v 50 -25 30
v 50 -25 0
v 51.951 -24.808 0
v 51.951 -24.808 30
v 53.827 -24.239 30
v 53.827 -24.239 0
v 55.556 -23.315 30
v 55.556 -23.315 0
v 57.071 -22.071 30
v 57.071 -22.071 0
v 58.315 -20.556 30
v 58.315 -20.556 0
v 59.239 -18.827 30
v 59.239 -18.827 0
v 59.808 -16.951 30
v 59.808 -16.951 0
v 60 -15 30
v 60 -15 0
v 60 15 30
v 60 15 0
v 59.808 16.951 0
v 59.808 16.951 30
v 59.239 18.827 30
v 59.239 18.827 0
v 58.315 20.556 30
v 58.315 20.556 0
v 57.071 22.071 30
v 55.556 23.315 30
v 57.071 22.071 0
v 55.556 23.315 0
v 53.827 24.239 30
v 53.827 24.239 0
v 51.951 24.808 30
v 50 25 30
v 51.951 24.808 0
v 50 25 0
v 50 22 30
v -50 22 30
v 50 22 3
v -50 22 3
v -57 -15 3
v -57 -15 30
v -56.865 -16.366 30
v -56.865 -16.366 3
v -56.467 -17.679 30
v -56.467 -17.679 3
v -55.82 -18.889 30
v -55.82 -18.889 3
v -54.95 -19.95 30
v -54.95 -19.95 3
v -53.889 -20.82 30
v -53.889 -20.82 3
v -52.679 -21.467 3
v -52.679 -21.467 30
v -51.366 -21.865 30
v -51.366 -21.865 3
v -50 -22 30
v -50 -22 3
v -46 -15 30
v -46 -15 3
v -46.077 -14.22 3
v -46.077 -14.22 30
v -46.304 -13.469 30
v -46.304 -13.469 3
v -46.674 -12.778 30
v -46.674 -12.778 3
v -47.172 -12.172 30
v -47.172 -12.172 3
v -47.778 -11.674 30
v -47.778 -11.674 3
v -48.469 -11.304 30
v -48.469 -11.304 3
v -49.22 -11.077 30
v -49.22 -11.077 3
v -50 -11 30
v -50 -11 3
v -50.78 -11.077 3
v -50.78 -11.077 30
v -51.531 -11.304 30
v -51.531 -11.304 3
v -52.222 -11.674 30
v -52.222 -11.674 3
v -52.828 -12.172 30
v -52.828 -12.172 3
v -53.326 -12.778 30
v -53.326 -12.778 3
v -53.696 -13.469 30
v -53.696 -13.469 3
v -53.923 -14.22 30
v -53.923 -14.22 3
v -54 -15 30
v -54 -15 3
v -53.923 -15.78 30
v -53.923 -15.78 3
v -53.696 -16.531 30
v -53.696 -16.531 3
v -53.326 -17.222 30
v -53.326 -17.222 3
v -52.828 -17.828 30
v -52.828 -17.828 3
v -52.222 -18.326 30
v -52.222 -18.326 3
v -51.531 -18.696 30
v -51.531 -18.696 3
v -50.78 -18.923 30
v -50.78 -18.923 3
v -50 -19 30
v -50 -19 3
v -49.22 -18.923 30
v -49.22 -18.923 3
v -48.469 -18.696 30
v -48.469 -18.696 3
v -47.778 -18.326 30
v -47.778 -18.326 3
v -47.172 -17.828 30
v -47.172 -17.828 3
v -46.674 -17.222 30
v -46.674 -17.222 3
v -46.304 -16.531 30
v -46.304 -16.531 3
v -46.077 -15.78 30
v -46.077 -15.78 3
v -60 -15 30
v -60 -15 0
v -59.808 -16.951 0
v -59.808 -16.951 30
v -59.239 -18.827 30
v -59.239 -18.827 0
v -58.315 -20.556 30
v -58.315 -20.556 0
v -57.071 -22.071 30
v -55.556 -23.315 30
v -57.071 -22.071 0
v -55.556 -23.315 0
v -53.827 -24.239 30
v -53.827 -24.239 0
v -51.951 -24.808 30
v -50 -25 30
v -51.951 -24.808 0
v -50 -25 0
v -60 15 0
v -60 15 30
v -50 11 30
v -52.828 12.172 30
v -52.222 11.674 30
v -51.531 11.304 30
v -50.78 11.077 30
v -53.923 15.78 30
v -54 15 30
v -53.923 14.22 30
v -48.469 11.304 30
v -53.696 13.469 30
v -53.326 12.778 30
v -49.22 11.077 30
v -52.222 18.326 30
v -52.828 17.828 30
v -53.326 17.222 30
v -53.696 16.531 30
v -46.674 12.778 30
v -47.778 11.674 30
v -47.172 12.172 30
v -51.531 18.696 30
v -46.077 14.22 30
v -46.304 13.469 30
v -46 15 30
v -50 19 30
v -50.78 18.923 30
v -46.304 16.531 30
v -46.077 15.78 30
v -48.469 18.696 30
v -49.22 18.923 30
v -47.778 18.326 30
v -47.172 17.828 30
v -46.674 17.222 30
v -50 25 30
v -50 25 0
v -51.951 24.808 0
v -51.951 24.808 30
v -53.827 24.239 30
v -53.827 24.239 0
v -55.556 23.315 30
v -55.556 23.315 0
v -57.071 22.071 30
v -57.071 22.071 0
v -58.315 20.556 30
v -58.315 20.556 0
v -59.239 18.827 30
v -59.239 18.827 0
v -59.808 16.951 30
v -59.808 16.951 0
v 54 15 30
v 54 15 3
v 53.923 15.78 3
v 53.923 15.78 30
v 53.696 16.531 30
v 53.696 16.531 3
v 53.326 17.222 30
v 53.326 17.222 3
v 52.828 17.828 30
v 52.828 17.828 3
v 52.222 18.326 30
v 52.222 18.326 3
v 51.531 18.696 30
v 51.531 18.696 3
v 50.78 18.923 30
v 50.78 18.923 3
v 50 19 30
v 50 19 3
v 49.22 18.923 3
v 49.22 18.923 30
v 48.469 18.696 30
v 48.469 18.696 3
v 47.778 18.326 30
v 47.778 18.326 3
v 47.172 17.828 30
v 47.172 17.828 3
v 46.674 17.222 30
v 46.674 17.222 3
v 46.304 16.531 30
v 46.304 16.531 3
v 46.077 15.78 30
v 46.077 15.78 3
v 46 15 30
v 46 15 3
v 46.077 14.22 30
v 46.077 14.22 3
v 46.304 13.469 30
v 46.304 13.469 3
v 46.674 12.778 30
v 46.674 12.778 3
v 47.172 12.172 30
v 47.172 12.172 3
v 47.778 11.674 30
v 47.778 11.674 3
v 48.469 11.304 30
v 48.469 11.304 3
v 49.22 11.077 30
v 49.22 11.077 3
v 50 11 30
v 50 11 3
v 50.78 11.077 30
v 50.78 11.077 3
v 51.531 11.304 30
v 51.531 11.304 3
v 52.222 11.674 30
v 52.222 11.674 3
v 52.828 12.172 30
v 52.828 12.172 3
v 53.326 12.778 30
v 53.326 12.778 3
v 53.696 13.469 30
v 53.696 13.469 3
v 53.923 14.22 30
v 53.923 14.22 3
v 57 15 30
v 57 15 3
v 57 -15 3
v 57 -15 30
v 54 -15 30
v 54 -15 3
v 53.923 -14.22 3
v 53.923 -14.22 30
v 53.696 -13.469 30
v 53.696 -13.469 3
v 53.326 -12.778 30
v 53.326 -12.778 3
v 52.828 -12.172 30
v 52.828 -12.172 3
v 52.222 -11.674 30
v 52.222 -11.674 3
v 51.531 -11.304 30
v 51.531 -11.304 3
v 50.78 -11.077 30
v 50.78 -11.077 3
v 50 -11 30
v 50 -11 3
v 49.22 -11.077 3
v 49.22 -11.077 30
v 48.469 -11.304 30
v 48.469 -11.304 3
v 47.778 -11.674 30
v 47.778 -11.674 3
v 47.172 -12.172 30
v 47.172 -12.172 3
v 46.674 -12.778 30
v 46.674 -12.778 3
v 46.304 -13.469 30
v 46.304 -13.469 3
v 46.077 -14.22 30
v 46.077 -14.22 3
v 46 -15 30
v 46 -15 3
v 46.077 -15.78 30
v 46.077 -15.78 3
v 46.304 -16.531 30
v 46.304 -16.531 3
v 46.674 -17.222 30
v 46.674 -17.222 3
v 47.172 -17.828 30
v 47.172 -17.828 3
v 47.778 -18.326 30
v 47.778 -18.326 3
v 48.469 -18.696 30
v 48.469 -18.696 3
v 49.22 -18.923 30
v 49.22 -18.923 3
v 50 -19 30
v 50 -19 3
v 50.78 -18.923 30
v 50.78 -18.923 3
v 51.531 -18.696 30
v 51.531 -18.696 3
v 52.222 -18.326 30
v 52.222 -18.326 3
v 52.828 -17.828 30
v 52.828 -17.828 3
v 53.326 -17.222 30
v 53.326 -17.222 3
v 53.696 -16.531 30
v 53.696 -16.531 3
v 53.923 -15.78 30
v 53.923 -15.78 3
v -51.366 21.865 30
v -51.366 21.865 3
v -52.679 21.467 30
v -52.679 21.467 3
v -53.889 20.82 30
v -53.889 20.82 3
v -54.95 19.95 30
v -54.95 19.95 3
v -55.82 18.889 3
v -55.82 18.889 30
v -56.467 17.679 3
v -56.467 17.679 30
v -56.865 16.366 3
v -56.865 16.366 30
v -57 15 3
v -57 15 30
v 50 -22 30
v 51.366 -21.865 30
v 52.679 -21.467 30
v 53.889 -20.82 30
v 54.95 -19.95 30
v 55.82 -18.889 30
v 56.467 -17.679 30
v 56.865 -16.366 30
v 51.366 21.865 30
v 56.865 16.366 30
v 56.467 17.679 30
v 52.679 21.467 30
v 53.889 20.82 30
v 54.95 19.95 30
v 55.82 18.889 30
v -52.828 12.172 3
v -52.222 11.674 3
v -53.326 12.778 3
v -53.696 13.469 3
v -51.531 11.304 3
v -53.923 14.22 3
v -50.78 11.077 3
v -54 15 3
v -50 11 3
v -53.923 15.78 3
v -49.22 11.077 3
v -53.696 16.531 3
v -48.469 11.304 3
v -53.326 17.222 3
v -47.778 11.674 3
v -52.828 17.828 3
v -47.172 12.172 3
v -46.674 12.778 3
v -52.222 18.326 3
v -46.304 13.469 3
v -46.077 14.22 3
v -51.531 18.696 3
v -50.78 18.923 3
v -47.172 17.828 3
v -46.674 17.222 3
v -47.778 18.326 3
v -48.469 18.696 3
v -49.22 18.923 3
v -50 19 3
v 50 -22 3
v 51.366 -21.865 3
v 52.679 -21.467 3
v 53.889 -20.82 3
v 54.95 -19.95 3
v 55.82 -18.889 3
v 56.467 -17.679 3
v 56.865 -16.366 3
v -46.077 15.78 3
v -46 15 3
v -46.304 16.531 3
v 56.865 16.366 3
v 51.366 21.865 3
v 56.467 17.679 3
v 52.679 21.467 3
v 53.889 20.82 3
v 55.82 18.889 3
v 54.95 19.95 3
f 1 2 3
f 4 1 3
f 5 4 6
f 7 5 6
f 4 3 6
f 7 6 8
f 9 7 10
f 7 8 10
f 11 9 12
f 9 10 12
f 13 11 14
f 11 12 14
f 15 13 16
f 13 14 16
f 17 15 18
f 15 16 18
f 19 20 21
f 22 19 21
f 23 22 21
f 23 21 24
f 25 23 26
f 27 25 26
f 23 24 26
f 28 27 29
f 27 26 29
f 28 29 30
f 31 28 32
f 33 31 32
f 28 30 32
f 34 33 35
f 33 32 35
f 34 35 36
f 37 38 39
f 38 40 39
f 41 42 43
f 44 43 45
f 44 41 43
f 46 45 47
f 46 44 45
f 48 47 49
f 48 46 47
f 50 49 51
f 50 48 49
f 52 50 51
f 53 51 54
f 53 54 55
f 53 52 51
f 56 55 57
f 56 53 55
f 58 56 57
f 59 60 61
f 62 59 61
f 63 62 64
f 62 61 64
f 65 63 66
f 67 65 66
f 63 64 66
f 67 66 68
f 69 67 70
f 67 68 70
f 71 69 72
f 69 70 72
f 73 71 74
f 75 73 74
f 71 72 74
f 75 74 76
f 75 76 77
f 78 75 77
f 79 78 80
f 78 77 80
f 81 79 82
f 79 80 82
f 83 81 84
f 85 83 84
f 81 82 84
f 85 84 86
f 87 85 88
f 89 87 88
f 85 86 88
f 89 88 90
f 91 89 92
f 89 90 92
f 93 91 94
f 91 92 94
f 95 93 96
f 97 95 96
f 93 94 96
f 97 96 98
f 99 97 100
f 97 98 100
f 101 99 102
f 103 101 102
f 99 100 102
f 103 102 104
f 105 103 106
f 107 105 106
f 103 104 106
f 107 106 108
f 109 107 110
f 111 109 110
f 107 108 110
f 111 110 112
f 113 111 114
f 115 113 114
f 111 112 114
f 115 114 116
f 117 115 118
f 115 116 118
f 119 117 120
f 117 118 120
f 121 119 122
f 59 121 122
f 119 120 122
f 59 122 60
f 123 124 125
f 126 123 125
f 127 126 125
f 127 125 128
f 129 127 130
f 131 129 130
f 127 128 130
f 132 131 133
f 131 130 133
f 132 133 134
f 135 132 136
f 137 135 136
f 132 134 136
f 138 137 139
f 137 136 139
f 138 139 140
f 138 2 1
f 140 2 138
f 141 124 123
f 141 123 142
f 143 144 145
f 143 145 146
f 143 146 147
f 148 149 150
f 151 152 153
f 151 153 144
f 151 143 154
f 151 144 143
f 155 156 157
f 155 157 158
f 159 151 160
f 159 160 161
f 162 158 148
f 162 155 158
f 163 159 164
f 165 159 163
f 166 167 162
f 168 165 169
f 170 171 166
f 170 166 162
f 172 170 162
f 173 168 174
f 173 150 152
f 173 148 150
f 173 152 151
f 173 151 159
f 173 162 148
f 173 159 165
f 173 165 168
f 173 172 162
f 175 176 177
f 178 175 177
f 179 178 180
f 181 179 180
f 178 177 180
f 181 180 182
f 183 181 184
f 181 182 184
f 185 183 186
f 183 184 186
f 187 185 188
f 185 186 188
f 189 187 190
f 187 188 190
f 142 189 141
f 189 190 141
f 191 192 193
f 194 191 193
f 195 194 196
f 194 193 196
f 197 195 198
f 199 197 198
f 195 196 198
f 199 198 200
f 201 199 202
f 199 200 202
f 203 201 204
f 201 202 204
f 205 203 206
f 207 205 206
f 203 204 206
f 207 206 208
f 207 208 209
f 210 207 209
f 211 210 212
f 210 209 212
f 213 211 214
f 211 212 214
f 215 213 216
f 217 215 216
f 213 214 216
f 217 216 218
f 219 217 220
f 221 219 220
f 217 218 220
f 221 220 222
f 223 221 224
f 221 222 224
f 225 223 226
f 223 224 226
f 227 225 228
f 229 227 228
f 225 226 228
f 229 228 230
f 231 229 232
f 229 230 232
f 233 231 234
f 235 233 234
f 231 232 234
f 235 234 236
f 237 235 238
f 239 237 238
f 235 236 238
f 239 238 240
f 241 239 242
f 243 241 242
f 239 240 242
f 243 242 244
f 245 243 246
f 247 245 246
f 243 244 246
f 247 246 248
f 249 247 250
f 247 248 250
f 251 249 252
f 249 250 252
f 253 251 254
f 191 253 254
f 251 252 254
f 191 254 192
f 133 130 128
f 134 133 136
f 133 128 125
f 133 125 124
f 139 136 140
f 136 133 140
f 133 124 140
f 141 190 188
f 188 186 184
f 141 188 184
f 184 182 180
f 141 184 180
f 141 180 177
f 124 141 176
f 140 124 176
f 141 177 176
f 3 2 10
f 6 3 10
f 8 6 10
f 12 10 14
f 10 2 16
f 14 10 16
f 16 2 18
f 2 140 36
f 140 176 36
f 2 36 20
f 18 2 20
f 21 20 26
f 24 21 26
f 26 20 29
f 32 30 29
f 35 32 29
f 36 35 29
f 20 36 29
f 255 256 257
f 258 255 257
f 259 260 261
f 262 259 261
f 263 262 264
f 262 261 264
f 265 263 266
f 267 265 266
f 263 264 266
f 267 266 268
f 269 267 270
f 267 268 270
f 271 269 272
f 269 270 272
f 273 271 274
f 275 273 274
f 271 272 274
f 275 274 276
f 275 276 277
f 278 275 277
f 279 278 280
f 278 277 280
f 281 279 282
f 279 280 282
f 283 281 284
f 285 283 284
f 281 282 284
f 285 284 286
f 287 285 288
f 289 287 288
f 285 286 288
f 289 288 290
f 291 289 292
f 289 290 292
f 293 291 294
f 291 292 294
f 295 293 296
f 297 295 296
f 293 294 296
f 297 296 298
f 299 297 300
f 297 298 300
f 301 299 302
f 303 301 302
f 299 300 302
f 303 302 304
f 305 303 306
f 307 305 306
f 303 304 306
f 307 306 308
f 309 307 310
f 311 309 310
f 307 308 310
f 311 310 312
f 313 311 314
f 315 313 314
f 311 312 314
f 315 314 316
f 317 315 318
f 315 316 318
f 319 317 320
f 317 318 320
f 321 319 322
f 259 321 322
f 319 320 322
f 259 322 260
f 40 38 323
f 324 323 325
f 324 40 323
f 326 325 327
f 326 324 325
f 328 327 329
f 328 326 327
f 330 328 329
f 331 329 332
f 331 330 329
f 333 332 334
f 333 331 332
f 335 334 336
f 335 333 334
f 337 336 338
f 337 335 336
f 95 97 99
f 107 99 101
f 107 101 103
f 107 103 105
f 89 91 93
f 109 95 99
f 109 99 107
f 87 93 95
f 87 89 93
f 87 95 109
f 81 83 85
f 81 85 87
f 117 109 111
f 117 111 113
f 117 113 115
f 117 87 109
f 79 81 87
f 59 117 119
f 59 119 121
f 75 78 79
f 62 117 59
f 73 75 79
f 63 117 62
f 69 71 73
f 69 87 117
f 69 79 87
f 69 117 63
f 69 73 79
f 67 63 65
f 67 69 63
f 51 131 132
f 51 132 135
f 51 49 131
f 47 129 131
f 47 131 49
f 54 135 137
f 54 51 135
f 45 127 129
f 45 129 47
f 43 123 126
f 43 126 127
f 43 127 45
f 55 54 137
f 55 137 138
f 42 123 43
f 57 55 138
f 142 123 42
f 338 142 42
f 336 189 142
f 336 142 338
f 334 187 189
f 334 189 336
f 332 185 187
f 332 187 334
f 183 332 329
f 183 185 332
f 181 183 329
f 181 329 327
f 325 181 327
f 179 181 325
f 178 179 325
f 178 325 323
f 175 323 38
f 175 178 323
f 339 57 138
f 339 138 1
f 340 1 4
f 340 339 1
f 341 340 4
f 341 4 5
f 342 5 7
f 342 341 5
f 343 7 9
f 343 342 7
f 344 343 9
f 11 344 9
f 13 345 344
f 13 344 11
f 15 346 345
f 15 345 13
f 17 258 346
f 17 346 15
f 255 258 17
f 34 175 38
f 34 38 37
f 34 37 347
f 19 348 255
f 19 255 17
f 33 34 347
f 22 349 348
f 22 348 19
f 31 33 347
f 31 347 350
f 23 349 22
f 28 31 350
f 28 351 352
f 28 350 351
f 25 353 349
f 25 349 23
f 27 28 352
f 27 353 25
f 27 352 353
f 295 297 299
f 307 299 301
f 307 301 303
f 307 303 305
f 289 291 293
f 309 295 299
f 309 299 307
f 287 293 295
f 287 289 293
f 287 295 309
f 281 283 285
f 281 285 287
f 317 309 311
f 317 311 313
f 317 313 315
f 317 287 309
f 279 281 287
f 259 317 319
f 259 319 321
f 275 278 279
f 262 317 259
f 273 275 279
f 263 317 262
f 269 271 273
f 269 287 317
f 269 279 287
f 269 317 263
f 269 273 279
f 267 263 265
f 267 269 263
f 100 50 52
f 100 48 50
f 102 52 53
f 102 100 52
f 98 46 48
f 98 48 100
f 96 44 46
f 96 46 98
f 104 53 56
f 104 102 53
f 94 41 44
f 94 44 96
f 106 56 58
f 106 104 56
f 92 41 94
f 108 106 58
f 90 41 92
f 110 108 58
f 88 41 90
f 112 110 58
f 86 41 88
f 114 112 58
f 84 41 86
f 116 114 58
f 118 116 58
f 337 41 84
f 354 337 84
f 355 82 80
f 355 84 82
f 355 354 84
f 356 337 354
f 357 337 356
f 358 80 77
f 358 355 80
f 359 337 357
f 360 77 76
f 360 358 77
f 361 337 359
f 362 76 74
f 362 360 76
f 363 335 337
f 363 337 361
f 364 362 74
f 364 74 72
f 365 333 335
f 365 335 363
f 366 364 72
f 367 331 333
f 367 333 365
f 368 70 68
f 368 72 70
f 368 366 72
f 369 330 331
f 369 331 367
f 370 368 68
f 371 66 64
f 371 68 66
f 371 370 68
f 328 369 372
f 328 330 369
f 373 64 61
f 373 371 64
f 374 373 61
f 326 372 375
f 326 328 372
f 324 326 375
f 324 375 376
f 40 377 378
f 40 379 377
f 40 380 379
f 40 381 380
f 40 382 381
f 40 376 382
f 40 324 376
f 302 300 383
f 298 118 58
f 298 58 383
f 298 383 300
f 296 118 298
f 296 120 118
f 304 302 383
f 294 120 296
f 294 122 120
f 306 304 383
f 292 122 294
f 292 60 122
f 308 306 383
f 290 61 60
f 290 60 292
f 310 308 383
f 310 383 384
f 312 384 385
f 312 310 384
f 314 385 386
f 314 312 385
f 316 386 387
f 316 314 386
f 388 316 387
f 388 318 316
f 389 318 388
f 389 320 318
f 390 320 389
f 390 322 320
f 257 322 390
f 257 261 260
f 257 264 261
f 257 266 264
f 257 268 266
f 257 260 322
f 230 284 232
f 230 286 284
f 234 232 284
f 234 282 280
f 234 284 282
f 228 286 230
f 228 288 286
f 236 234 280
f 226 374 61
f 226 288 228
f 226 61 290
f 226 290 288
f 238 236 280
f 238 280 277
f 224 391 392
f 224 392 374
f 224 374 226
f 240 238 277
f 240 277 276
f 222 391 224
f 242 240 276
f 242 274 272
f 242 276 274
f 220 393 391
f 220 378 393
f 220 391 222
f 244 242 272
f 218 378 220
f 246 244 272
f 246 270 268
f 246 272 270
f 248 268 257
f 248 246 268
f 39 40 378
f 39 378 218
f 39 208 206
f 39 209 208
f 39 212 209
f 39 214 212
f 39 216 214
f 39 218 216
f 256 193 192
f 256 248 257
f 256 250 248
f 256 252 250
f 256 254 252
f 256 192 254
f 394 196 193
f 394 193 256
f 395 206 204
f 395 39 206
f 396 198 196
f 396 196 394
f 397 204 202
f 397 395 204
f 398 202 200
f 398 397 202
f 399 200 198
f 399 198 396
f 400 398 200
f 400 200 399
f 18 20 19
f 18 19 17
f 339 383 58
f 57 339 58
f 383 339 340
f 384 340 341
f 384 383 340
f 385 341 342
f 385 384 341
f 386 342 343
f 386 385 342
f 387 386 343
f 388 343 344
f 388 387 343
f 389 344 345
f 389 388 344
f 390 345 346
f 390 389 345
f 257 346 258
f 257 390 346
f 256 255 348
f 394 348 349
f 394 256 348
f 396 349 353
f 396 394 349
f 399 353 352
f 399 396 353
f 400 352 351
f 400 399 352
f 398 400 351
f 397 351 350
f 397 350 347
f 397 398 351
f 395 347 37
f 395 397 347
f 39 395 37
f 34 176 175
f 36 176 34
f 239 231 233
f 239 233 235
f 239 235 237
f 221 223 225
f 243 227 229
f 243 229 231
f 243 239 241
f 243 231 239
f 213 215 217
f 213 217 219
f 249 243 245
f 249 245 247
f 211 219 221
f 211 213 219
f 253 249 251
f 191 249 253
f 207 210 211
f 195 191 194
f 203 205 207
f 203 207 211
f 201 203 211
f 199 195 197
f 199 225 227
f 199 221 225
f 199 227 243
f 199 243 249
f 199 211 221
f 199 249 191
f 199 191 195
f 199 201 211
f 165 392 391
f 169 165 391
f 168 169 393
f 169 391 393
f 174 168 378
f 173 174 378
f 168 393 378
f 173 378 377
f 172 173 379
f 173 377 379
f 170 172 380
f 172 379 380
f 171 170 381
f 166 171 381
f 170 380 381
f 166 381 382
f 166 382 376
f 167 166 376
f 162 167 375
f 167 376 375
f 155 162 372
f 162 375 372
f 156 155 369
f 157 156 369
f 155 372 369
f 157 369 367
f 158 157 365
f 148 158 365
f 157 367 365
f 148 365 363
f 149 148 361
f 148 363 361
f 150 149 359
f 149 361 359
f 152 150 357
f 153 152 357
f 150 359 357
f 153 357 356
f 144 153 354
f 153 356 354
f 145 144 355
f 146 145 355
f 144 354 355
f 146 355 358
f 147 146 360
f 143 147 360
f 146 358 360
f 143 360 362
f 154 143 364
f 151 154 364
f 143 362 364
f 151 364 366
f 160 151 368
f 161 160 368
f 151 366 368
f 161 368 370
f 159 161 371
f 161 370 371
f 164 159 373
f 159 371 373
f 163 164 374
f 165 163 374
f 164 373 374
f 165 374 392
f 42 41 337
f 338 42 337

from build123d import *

# Parameters (mm, degrees)
PAD_DEPTH    = 30
THICKNESS_T  = -3
SKETCH001_R  = 4
PAD001_DEPTH = 27


with BuildPart() as part:
    # Sketch → Pad (new body)
    with BuildSketch(Plane.XY):
        with BuildLine():
            ThreePointArc((-50, 25), (-57.071068, 22.071068), (-60, 15))
            Line((-60, -15), (-60, 15))
            ThreePointArc((-60, -15), (-57.071068, -22.071068), (-50, -25))
            Line((50, -25), (-50, -25))
            ThreePointArc((50, -25), (57.071068, -22.071068), (60, -15))
            Line((60, 15), (60, -15))
            ThreePointArc((60, 15), (57.071068, 22.071068), (50, 25))
            Line((-50, 25), (50, 25))
        make_face()
    extrude(amount=PAD_DEPTH)

    # Thickness
    thickness_openings = [part.faces().sort_by_distance(p)[0] for p in [
        (0, 0, 30),
    ]]
    offset(amount=THICKNESS_T, openings=thickness_openings)

    # Sketch001 (on Face19 of Thickness) → Pad001 (join)
    with BuildSketch(Plane.XY.offset(3)):
        with Locations((-50, 15)):
            Circle(SKETCH001_R)
        with Locations((-50, -15)):
            Circle(SKETCH001_R)
        with Locations((50, 15)):
            Circle(SKETCH001_R)
        with Locations((50, -15)):
            Circle(SKETCH001_R)
    extrude(amount=PAD001_DEPTH)


solid = part.part
